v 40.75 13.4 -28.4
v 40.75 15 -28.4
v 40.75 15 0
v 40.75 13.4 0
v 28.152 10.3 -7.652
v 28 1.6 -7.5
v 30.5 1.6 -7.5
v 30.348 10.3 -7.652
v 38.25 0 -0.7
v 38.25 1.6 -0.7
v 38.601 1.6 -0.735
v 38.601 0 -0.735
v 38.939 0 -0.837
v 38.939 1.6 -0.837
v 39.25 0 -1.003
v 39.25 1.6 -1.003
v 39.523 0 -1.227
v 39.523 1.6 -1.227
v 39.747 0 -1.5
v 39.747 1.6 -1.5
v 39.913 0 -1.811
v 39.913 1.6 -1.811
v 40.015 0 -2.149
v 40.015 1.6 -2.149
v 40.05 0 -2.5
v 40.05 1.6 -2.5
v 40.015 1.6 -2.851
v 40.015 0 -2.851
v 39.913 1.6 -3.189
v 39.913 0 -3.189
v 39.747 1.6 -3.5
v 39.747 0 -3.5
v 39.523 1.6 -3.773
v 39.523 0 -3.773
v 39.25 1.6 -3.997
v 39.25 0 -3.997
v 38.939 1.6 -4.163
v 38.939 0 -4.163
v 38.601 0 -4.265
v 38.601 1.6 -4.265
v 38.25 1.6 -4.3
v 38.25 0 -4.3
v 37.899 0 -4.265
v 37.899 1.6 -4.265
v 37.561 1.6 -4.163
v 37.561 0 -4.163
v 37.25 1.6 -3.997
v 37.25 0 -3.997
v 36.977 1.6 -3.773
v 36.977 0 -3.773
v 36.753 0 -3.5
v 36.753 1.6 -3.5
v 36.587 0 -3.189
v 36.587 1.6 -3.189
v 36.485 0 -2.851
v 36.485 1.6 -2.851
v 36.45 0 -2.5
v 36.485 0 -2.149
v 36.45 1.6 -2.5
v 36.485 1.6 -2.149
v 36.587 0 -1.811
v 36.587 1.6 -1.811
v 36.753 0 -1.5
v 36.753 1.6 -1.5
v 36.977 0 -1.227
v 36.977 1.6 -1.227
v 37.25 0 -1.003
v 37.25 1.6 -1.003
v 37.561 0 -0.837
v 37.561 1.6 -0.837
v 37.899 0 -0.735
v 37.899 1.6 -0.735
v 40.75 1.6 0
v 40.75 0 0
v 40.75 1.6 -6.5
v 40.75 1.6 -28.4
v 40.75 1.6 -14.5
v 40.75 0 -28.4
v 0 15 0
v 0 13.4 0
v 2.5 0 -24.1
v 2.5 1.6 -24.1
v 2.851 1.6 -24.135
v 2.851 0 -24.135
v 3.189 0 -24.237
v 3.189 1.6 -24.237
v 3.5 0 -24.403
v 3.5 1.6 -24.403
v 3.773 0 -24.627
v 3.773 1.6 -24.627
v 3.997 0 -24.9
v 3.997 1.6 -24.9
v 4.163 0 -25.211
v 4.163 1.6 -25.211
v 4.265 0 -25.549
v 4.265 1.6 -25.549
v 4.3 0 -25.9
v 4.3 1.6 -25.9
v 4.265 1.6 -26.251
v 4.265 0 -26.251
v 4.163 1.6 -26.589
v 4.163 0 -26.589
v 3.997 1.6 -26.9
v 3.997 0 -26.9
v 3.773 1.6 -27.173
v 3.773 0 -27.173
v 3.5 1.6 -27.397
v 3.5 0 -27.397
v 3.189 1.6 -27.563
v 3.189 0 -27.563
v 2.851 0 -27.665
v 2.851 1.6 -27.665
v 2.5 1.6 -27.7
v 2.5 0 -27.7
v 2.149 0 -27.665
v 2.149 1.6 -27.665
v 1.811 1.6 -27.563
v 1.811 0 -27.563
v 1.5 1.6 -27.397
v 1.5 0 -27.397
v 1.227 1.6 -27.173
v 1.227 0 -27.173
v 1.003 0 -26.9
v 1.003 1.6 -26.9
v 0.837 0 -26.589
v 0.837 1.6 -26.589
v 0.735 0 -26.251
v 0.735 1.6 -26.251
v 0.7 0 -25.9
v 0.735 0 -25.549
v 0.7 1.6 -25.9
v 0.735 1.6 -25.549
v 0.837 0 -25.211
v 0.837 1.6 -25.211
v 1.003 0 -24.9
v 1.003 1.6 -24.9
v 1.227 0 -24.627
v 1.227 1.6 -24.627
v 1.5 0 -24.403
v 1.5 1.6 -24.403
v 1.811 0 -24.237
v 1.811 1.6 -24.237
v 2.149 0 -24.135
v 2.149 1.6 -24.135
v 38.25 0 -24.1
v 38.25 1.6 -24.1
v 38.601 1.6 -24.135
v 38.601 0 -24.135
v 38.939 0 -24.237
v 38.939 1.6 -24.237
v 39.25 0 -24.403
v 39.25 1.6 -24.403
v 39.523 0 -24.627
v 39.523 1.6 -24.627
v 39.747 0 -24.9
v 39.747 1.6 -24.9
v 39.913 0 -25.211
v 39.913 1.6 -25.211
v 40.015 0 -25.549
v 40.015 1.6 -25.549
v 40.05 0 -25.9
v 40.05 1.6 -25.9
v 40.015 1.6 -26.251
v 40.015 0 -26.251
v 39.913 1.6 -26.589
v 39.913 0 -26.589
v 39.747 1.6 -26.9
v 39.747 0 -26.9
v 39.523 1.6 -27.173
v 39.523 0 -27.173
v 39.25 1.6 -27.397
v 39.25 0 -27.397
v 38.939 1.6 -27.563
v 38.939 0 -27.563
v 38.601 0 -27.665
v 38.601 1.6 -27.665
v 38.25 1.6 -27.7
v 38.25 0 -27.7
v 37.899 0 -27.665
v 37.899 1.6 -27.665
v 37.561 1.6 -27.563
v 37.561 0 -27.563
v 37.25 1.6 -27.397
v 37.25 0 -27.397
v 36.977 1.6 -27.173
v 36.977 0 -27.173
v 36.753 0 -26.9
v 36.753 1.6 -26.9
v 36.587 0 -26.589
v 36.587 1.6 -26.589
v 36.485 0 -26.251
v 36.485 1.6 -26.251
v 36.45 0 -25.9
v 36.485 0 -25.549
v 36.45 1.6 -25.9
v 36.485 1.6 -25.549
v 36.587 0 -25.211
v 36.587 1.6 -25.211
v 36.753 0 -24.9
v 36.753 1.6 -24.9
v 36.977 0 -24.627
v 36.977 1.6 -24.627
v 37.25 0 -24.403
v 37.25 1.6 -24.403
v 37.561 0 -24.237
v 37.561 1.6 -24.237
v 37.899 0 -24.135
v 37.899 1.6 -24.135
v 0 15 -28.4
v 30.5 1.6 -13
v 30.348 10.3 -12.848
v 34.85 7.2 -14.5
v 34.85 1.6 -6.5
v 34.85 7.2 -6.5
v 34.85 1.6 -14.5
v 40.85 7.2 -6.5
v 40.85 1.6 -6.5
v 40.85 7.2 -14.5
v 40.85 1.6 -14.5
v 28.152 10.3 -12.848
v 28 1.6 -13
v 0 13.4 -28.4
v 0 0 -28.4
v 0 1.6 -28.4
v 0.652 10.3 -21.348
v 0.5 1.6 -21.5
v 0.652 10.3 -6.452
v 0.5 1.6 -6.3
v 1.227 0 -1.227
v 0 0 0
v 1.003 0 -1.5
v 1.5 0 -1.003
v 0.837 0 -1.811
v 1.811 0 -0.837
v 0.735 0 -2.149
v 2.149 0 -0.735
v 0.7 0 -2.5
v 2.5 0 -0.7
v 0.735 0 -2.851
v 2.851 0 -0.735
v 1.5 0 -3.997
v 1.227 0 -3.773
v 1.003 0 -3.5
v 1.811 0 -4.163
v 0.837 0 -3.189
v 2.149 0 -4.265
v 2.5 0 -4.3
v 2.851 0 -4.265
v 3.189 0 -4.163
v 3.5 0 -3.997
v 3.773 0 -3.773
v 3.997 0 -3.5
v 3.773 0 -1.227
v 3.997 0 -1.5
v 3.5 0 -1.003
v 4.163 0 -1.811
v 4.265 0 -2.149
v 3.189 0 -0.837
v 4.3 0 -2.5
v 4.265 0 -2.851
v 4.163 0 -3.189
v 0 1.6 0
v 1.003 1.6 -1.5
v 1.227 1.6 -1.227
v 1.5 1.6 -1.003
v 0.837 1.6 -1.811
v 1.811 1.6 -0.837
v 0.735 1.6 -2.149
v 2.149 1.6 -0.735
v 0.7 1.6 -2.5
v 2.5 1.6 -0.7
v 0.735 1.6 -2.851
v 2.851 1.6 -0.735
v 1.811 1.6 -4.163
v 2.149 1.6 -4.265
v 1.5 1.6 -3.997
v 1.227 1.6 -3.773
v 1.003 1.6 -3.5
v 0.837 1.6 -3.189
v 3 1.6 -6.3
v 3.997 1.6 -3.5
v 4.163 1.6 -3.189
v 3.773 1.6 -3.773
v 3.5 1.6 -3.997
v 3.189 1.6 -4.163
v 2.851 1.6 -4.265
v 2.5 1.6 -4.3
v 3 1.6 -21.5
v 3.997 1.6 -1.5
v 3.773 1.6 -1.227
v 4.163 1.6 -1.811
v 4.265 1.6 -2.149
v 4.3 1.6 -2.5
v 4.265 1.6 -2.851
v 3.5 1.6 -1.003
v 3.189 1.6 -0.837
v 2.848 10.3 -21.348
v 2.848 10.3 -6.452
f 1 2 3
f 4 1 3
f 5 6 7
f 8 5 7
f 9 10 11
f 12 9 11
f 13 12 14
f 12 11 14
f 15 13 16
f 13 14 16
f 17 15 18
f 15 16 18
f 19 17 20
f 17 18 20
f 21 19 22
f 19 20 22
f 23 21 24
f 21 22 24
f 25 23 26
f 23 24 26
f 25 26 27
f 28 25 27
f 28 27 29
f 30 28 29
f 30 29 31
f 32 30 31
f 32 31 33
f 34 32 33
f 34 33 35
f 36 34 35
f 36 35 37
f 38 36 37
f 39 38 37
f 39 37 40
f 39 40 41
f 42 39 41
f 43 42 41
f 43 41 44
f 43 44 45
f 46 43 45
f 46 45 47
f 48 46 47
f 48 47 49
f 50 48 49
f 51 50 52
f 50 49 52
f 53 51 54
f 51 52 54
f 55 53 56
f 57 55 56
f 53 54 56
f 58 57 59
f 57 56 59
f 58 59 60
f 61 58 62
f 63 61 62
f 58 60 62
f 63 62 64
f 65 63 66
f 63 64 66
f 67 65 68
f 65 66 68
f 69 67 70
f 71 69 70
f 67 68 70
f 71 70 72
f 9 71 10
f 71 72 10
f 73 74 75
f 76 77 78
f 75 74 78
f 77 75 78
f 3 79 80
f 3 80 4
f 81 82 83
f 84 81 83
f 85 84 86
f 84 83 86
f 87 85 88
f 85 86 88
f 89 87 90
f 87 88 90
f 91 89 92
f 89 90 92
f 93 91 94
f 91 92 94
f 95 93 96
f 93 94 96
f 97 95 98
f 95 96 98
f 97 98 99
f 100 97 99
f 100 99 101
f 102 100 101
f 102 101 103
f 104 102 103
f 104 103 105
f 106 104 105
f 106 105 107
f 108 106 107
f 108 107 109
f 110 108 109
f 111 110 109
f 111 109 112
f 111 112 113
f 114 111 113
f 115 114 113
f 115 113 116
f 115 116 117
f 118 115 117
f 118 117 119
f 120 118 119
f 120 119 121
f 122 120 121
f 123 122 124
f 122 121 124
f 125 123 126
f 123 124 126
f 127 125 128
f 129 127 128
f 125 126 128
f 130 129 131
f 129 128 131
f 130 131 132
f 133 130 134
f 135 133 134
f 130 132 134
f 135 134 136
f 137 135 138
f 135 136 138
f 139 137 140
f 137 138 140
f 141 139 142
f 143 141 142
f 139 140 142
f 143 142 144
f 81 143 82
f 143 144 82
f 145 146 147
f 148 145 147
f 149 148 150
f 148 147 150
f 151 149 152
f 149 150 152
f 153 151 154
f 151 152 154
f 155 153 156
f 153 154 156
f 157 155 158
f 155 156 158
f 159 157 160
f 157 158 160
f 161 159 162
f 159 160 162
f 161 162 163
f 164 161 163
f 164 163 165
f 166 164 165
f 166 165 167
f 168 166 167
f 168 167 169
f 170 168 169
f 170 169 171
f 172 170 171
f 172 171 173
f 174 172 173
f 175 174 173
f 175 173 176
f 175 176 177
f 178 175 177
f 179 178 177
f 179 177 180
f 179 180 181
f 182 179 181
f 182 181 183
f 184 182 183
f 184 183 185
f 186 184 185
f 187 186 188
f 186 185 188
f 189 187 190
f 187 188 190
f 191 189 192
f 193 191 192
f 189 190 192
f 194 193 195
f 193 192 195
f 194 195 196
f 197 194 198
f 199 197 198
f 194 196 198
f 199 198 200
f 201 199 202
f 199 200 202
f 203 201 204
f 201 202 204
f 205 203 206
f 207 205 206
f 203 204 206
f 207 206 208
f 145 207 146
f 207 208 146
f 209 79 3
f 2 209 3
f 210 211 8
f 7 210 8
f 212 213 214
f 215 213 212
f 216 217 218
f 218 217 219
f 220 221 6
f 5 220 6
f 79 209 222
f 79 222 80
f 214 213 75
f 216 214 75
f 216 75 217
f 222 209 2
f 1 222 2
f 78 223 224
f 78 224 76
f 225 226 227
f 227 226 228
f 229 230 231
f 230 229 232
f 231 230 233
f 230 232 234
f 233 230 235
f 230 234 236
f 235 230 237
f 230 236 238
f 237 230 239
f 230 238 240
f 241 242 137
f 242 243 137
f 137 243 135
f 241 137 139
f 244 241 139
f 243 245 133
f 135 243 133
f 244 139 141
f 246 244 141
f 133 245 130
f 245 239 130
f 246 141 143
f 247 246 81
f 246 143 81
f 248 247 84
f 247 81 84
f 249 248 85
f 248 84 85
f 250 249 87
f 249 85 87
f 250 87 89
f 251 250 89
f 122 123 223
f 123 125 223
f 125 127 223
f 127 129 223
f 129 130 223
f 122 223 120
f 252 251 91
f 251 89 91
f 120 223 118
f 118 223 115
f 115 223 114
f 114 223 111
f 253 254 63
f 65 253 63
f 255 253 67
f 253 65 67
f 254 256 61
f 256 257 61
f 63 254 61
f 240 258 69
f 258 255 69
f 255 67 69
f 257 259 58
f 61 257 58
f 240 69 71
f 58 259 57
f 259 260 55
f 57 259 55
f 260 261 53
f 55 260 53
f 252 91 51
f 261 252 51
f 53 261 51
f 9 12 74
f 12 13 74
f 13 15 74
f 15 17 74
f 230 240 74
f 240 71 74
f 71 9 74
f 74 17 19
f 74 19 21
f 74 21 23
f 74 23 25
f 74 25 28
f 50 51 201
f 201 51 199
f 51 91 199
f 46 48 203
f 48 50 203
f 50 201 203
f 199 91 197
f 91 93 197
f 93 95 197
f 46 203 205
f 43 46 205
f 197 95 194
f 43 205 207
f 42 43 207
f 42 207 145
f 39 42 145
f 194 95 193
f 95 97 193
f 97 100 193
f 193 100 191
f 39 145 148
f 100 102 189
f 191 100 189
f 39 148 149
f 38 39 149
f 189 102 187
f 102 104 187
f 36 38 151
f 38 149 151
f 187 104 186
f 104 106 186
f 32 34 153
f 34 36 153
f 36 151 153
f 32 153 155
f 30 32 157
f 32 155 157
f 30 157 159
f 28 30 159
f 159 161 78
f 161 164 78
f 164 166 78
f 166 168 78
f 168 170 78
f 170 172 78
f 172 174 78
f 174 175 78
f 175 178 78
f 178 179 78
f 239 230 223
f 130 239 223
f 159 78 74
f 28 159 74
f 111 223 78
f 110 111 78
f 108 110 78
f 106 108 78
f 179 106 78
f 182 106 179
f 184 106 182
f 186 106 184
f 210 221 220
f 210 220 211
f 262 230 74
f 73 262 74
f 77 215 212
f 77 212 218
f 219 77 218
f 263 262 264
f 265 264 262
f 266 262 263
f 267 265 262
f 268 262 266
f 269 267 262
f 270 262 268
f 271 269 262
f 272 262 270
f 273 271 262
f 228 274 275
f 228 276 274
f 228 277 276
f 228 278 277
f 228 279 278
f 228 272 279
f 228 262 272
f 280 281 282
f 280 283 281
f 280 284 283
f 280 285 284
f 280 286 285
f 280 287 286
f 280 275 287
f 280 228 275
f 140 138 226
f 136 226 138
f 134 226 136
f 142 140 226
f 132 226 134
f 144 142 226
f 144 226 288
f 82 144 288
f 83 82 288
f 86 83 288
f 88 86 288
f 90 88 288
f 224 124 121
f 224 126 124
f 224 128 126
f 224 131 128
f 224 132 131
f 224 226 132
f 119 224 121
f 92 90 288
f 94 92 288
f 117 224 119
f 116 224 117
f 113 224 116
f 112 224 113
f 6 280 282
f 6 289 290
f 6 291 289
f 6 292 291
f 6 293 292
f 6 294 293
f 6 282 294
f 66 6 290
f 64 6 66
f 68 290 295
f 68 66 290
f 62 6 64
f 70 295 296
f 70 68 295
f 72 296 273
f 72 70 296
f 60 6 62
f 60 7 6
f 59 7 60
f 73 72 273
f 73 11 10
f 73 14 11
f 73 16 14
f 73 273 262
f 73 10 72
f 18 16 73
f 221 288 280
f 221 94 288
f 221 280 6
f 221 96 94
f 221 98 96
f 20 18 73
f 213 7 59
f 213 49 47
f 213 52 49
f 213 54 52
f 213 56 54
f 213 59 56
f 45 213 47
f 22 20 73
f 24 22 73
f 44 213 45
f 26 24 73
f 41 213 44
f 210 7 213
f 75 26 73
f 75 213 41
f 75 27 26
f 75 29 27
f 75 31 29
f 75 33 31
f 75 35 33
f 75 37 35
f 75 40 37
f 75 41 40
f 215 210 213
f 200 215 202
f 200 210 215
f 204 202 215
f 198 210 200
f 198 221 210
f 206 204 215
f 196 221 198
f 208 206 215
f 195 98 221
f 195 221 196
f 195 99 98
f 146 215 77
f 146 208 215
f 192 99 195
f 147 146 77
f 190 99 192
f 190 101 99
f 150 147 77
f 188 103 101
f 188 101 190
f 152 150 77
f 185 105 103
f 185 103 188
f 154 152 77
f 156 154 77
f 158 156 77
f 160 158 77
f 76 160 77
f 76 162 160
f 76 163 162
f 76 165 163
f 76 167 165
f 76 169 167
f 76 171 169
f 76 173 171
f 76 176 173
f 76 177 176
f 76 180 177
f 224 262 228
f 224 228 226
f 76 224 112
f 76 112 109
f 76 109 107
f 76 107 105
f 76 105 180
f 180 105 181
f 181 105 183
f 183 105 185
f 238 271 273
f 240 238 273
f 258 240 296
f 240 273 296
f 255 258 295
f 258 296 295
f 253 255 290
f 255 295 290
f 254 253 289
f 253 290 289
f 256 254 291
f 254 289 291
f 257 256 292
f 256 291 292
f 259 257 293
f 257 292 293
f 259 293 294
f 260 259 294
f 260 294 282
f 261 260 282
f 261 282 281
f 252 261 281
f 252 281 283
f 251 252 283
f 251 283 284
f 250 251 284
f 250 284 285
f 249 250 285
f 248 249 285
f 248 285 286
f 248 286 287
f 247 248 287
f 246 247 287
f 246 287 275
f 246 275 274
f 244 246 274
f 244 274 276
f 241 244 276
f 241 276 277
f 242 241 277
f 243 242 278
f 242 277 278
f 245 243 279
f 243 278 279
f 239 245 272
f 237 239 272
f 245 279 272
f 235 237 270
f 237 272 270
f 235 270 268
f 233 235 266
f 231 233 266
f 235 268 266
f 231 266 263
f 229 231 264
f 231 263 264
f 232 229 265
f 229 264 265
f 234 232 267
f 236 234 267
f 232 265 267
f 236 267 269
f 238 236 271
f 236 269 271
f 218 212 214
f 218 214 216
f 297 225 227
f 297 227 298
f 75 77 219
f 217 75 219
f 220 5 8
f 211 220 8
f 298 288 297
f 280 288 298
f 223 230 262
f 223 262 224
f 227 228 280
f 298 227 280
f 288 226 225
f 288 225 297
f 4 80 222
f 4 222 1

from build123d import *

# Parameters (mm, degrees)
ESQUISSE1_W                  = 40.75
ESQUISSE1_H                  = 28.4
BOSS_EXTRU_1_DEPTH           = 1.6
ESQUISSE2_R                  = 1.8
ENL_V_MAT_EXTRU_1_DEPTH      = 50.695900233
ESQUISSE3_W                  = 6
ESQUISSE3_H                  = 8
BOSS_EXTRU_2_DEPTH           = 5.6
ESQUISSE4_W                  = 2.5
ESQUISSE4_H                  = 15.2
BOSS_EXTRU_3_DEPTH           = 8.7
BOSS_EXTRU_3_DRAFT           = -1
ESQUISSE4_H_2                = 5.5
BOSS_EXTRU_3_PROFILE_2_DEPTH = 8.7
BOSS_EXTRU_3_PROFILE_2_DRAFT = -1
ESQUISSE5_W                  = 40.75
ESQUISSE5_H                  = 28.4
BOSS_EXTRU_4_DEPTH           = 1.6


with BuildPart() as part:
    # Esquisse1 → Boss.-Extru.1 (new body)
    with BuildSketch(Plane(origin=(0, 0, 0), x_dir=(1, 0, 0), z_dir=(0, 1, 0))):
        with Locations((20.375, 14.2)):
            Rectangle(ESQUISSE1_W, ESQUISSE1_H)
    extrude(amount=BOSS_EXTRU_1_DEPTH)

    # Esquisse2 → Enlèv. mat.-Extru.1 (cut, through all)
    with BuildSketch(Plane(origin=(0, 1.6, 0), x_dir=(1, 0, 0), z_dir=(0, 1, 0))):
        with Locations(Location((2.5, 25.9, 0), (0, 0, 270))):
            Circle(ESQUISSE2_R)
        with Locations(Location((38.25, 25.9, 0), (0, 0, 270))):
            Circle(ESQUISSE2_R)
        with Locations(Location((38.25, 2.5, 0), (0, 0, 270))):
            Circle(ESQUISSE2_R)
        with Locations(Location((2.5, 2.5, 0), (0, 0, 270))):
            Circle(ESQUISSE2_R)
    extrude(amount=-ENL_V_MAT_EXTRU_1_DEPTH, mode=Mode.SUBTRACT)

    # Esquisse3 → Boss.-Extru.2 (add)
    with BuildSketch(Plane(origin=(0, 1.6, 0), x_dir=(1, 0, 0), z_dir=(0, 1, 0))):
        with Locations((37.85, 10.5)):
            Rectangle(ESQUISSE3_W, ESQUISSE3_H)
    extrude(amount=BOSS_EXTRU_2_DEPTH)


with BuildPart() as boss_extru_3_tool:
    # Esquisse4 → Boss.-Extru.3 (with draft: the straight prism first)
    with BuildSketch(Plane.XZ.offset(-1.6)):
        with Locations((1.75, -13.9)):
            Rectangle(ESQUISSE4_W, ESQUISSE4_H)
    extrude(amount=-BOSS_EXTRU_3_DEPTH)
    # Boss.-Extru.3: the draft: its side faces are tilted about the plane it starts from
    boss_extru_3_sides = [boss_extru_3_tool.faces().sort_by_distance(p)[0] for p in [
        (0.5, 5.95, -13.9),
        (1.75, 5.95, -21.5),
        (3, 5.95, -13.9),
        (1.75, 5.95, -6.3),
    ]]
    draft(boss_extru_3_sides, Plane.XZ.offset(-1.6), BOSS_EXTRU_3_DRAFT)


with BuildPart() as part_1:
    add(part.part)

    # Boss.-Extru.3: add boss_extru_3_tool
    add(boss_extru_3_tool.part)


with BuildPart() as boss_extru_3_profile_2_tool:
    # Esquisse4 → Boss.-Extru.3 profile 2 (with draft: the straight prism first)
    with BuildSketch(Plane.XZ.offset(-1.6)):
        with Locations((29.25, -10.25)):
            Rectangle(ESQUISSE4_W, ESQUISSE4_H_2)
    extrude(amount=-BOSS_EXTRU_3_PROFILE_2_DEPTH)
    # Boss.-Extru.3 profile 2: the draft: its side faces are tilted about the plane it starts from
    boss_extru_3_profile_2_sides = [boss_extru_3_profile_2_tool.faces().sort_by_distance(p)[0] for p in [
        (28, 5.95, -10.25),
        (29.25, 5.95, -13),
        (30.5, 5.95, -10.25),
        (29.25, 5.95, -7.5),
    ]]
    draft(boss_extru_3_profile_2_sides, Plane.XZ.offset(-1.6), BOSS_EXTRU_3_PROFILE_2_DRAFT)


with BuildPart() as part_2:
    add(part_1.part)

    # Boss.-Extru.3 profile 2: add boss_extru_3_profile_2_tool
    add(boss_extru_3_profile_2_tool.part)


with BuildPart() as body_2:
    # Esquisse5 → Boss.-Extru.4 (new body)
    with BuildSketch(Plane.XZ.offset(-15)):
        with Locations((20.375, -14.2)):
            Rectangle(ESQUISSE5_W, ESQUISSE5_H)
    extrude(amount=BOSS_EXTRU_4_DEPTH)


solid = Compound([part_2.part, body_2.part])
